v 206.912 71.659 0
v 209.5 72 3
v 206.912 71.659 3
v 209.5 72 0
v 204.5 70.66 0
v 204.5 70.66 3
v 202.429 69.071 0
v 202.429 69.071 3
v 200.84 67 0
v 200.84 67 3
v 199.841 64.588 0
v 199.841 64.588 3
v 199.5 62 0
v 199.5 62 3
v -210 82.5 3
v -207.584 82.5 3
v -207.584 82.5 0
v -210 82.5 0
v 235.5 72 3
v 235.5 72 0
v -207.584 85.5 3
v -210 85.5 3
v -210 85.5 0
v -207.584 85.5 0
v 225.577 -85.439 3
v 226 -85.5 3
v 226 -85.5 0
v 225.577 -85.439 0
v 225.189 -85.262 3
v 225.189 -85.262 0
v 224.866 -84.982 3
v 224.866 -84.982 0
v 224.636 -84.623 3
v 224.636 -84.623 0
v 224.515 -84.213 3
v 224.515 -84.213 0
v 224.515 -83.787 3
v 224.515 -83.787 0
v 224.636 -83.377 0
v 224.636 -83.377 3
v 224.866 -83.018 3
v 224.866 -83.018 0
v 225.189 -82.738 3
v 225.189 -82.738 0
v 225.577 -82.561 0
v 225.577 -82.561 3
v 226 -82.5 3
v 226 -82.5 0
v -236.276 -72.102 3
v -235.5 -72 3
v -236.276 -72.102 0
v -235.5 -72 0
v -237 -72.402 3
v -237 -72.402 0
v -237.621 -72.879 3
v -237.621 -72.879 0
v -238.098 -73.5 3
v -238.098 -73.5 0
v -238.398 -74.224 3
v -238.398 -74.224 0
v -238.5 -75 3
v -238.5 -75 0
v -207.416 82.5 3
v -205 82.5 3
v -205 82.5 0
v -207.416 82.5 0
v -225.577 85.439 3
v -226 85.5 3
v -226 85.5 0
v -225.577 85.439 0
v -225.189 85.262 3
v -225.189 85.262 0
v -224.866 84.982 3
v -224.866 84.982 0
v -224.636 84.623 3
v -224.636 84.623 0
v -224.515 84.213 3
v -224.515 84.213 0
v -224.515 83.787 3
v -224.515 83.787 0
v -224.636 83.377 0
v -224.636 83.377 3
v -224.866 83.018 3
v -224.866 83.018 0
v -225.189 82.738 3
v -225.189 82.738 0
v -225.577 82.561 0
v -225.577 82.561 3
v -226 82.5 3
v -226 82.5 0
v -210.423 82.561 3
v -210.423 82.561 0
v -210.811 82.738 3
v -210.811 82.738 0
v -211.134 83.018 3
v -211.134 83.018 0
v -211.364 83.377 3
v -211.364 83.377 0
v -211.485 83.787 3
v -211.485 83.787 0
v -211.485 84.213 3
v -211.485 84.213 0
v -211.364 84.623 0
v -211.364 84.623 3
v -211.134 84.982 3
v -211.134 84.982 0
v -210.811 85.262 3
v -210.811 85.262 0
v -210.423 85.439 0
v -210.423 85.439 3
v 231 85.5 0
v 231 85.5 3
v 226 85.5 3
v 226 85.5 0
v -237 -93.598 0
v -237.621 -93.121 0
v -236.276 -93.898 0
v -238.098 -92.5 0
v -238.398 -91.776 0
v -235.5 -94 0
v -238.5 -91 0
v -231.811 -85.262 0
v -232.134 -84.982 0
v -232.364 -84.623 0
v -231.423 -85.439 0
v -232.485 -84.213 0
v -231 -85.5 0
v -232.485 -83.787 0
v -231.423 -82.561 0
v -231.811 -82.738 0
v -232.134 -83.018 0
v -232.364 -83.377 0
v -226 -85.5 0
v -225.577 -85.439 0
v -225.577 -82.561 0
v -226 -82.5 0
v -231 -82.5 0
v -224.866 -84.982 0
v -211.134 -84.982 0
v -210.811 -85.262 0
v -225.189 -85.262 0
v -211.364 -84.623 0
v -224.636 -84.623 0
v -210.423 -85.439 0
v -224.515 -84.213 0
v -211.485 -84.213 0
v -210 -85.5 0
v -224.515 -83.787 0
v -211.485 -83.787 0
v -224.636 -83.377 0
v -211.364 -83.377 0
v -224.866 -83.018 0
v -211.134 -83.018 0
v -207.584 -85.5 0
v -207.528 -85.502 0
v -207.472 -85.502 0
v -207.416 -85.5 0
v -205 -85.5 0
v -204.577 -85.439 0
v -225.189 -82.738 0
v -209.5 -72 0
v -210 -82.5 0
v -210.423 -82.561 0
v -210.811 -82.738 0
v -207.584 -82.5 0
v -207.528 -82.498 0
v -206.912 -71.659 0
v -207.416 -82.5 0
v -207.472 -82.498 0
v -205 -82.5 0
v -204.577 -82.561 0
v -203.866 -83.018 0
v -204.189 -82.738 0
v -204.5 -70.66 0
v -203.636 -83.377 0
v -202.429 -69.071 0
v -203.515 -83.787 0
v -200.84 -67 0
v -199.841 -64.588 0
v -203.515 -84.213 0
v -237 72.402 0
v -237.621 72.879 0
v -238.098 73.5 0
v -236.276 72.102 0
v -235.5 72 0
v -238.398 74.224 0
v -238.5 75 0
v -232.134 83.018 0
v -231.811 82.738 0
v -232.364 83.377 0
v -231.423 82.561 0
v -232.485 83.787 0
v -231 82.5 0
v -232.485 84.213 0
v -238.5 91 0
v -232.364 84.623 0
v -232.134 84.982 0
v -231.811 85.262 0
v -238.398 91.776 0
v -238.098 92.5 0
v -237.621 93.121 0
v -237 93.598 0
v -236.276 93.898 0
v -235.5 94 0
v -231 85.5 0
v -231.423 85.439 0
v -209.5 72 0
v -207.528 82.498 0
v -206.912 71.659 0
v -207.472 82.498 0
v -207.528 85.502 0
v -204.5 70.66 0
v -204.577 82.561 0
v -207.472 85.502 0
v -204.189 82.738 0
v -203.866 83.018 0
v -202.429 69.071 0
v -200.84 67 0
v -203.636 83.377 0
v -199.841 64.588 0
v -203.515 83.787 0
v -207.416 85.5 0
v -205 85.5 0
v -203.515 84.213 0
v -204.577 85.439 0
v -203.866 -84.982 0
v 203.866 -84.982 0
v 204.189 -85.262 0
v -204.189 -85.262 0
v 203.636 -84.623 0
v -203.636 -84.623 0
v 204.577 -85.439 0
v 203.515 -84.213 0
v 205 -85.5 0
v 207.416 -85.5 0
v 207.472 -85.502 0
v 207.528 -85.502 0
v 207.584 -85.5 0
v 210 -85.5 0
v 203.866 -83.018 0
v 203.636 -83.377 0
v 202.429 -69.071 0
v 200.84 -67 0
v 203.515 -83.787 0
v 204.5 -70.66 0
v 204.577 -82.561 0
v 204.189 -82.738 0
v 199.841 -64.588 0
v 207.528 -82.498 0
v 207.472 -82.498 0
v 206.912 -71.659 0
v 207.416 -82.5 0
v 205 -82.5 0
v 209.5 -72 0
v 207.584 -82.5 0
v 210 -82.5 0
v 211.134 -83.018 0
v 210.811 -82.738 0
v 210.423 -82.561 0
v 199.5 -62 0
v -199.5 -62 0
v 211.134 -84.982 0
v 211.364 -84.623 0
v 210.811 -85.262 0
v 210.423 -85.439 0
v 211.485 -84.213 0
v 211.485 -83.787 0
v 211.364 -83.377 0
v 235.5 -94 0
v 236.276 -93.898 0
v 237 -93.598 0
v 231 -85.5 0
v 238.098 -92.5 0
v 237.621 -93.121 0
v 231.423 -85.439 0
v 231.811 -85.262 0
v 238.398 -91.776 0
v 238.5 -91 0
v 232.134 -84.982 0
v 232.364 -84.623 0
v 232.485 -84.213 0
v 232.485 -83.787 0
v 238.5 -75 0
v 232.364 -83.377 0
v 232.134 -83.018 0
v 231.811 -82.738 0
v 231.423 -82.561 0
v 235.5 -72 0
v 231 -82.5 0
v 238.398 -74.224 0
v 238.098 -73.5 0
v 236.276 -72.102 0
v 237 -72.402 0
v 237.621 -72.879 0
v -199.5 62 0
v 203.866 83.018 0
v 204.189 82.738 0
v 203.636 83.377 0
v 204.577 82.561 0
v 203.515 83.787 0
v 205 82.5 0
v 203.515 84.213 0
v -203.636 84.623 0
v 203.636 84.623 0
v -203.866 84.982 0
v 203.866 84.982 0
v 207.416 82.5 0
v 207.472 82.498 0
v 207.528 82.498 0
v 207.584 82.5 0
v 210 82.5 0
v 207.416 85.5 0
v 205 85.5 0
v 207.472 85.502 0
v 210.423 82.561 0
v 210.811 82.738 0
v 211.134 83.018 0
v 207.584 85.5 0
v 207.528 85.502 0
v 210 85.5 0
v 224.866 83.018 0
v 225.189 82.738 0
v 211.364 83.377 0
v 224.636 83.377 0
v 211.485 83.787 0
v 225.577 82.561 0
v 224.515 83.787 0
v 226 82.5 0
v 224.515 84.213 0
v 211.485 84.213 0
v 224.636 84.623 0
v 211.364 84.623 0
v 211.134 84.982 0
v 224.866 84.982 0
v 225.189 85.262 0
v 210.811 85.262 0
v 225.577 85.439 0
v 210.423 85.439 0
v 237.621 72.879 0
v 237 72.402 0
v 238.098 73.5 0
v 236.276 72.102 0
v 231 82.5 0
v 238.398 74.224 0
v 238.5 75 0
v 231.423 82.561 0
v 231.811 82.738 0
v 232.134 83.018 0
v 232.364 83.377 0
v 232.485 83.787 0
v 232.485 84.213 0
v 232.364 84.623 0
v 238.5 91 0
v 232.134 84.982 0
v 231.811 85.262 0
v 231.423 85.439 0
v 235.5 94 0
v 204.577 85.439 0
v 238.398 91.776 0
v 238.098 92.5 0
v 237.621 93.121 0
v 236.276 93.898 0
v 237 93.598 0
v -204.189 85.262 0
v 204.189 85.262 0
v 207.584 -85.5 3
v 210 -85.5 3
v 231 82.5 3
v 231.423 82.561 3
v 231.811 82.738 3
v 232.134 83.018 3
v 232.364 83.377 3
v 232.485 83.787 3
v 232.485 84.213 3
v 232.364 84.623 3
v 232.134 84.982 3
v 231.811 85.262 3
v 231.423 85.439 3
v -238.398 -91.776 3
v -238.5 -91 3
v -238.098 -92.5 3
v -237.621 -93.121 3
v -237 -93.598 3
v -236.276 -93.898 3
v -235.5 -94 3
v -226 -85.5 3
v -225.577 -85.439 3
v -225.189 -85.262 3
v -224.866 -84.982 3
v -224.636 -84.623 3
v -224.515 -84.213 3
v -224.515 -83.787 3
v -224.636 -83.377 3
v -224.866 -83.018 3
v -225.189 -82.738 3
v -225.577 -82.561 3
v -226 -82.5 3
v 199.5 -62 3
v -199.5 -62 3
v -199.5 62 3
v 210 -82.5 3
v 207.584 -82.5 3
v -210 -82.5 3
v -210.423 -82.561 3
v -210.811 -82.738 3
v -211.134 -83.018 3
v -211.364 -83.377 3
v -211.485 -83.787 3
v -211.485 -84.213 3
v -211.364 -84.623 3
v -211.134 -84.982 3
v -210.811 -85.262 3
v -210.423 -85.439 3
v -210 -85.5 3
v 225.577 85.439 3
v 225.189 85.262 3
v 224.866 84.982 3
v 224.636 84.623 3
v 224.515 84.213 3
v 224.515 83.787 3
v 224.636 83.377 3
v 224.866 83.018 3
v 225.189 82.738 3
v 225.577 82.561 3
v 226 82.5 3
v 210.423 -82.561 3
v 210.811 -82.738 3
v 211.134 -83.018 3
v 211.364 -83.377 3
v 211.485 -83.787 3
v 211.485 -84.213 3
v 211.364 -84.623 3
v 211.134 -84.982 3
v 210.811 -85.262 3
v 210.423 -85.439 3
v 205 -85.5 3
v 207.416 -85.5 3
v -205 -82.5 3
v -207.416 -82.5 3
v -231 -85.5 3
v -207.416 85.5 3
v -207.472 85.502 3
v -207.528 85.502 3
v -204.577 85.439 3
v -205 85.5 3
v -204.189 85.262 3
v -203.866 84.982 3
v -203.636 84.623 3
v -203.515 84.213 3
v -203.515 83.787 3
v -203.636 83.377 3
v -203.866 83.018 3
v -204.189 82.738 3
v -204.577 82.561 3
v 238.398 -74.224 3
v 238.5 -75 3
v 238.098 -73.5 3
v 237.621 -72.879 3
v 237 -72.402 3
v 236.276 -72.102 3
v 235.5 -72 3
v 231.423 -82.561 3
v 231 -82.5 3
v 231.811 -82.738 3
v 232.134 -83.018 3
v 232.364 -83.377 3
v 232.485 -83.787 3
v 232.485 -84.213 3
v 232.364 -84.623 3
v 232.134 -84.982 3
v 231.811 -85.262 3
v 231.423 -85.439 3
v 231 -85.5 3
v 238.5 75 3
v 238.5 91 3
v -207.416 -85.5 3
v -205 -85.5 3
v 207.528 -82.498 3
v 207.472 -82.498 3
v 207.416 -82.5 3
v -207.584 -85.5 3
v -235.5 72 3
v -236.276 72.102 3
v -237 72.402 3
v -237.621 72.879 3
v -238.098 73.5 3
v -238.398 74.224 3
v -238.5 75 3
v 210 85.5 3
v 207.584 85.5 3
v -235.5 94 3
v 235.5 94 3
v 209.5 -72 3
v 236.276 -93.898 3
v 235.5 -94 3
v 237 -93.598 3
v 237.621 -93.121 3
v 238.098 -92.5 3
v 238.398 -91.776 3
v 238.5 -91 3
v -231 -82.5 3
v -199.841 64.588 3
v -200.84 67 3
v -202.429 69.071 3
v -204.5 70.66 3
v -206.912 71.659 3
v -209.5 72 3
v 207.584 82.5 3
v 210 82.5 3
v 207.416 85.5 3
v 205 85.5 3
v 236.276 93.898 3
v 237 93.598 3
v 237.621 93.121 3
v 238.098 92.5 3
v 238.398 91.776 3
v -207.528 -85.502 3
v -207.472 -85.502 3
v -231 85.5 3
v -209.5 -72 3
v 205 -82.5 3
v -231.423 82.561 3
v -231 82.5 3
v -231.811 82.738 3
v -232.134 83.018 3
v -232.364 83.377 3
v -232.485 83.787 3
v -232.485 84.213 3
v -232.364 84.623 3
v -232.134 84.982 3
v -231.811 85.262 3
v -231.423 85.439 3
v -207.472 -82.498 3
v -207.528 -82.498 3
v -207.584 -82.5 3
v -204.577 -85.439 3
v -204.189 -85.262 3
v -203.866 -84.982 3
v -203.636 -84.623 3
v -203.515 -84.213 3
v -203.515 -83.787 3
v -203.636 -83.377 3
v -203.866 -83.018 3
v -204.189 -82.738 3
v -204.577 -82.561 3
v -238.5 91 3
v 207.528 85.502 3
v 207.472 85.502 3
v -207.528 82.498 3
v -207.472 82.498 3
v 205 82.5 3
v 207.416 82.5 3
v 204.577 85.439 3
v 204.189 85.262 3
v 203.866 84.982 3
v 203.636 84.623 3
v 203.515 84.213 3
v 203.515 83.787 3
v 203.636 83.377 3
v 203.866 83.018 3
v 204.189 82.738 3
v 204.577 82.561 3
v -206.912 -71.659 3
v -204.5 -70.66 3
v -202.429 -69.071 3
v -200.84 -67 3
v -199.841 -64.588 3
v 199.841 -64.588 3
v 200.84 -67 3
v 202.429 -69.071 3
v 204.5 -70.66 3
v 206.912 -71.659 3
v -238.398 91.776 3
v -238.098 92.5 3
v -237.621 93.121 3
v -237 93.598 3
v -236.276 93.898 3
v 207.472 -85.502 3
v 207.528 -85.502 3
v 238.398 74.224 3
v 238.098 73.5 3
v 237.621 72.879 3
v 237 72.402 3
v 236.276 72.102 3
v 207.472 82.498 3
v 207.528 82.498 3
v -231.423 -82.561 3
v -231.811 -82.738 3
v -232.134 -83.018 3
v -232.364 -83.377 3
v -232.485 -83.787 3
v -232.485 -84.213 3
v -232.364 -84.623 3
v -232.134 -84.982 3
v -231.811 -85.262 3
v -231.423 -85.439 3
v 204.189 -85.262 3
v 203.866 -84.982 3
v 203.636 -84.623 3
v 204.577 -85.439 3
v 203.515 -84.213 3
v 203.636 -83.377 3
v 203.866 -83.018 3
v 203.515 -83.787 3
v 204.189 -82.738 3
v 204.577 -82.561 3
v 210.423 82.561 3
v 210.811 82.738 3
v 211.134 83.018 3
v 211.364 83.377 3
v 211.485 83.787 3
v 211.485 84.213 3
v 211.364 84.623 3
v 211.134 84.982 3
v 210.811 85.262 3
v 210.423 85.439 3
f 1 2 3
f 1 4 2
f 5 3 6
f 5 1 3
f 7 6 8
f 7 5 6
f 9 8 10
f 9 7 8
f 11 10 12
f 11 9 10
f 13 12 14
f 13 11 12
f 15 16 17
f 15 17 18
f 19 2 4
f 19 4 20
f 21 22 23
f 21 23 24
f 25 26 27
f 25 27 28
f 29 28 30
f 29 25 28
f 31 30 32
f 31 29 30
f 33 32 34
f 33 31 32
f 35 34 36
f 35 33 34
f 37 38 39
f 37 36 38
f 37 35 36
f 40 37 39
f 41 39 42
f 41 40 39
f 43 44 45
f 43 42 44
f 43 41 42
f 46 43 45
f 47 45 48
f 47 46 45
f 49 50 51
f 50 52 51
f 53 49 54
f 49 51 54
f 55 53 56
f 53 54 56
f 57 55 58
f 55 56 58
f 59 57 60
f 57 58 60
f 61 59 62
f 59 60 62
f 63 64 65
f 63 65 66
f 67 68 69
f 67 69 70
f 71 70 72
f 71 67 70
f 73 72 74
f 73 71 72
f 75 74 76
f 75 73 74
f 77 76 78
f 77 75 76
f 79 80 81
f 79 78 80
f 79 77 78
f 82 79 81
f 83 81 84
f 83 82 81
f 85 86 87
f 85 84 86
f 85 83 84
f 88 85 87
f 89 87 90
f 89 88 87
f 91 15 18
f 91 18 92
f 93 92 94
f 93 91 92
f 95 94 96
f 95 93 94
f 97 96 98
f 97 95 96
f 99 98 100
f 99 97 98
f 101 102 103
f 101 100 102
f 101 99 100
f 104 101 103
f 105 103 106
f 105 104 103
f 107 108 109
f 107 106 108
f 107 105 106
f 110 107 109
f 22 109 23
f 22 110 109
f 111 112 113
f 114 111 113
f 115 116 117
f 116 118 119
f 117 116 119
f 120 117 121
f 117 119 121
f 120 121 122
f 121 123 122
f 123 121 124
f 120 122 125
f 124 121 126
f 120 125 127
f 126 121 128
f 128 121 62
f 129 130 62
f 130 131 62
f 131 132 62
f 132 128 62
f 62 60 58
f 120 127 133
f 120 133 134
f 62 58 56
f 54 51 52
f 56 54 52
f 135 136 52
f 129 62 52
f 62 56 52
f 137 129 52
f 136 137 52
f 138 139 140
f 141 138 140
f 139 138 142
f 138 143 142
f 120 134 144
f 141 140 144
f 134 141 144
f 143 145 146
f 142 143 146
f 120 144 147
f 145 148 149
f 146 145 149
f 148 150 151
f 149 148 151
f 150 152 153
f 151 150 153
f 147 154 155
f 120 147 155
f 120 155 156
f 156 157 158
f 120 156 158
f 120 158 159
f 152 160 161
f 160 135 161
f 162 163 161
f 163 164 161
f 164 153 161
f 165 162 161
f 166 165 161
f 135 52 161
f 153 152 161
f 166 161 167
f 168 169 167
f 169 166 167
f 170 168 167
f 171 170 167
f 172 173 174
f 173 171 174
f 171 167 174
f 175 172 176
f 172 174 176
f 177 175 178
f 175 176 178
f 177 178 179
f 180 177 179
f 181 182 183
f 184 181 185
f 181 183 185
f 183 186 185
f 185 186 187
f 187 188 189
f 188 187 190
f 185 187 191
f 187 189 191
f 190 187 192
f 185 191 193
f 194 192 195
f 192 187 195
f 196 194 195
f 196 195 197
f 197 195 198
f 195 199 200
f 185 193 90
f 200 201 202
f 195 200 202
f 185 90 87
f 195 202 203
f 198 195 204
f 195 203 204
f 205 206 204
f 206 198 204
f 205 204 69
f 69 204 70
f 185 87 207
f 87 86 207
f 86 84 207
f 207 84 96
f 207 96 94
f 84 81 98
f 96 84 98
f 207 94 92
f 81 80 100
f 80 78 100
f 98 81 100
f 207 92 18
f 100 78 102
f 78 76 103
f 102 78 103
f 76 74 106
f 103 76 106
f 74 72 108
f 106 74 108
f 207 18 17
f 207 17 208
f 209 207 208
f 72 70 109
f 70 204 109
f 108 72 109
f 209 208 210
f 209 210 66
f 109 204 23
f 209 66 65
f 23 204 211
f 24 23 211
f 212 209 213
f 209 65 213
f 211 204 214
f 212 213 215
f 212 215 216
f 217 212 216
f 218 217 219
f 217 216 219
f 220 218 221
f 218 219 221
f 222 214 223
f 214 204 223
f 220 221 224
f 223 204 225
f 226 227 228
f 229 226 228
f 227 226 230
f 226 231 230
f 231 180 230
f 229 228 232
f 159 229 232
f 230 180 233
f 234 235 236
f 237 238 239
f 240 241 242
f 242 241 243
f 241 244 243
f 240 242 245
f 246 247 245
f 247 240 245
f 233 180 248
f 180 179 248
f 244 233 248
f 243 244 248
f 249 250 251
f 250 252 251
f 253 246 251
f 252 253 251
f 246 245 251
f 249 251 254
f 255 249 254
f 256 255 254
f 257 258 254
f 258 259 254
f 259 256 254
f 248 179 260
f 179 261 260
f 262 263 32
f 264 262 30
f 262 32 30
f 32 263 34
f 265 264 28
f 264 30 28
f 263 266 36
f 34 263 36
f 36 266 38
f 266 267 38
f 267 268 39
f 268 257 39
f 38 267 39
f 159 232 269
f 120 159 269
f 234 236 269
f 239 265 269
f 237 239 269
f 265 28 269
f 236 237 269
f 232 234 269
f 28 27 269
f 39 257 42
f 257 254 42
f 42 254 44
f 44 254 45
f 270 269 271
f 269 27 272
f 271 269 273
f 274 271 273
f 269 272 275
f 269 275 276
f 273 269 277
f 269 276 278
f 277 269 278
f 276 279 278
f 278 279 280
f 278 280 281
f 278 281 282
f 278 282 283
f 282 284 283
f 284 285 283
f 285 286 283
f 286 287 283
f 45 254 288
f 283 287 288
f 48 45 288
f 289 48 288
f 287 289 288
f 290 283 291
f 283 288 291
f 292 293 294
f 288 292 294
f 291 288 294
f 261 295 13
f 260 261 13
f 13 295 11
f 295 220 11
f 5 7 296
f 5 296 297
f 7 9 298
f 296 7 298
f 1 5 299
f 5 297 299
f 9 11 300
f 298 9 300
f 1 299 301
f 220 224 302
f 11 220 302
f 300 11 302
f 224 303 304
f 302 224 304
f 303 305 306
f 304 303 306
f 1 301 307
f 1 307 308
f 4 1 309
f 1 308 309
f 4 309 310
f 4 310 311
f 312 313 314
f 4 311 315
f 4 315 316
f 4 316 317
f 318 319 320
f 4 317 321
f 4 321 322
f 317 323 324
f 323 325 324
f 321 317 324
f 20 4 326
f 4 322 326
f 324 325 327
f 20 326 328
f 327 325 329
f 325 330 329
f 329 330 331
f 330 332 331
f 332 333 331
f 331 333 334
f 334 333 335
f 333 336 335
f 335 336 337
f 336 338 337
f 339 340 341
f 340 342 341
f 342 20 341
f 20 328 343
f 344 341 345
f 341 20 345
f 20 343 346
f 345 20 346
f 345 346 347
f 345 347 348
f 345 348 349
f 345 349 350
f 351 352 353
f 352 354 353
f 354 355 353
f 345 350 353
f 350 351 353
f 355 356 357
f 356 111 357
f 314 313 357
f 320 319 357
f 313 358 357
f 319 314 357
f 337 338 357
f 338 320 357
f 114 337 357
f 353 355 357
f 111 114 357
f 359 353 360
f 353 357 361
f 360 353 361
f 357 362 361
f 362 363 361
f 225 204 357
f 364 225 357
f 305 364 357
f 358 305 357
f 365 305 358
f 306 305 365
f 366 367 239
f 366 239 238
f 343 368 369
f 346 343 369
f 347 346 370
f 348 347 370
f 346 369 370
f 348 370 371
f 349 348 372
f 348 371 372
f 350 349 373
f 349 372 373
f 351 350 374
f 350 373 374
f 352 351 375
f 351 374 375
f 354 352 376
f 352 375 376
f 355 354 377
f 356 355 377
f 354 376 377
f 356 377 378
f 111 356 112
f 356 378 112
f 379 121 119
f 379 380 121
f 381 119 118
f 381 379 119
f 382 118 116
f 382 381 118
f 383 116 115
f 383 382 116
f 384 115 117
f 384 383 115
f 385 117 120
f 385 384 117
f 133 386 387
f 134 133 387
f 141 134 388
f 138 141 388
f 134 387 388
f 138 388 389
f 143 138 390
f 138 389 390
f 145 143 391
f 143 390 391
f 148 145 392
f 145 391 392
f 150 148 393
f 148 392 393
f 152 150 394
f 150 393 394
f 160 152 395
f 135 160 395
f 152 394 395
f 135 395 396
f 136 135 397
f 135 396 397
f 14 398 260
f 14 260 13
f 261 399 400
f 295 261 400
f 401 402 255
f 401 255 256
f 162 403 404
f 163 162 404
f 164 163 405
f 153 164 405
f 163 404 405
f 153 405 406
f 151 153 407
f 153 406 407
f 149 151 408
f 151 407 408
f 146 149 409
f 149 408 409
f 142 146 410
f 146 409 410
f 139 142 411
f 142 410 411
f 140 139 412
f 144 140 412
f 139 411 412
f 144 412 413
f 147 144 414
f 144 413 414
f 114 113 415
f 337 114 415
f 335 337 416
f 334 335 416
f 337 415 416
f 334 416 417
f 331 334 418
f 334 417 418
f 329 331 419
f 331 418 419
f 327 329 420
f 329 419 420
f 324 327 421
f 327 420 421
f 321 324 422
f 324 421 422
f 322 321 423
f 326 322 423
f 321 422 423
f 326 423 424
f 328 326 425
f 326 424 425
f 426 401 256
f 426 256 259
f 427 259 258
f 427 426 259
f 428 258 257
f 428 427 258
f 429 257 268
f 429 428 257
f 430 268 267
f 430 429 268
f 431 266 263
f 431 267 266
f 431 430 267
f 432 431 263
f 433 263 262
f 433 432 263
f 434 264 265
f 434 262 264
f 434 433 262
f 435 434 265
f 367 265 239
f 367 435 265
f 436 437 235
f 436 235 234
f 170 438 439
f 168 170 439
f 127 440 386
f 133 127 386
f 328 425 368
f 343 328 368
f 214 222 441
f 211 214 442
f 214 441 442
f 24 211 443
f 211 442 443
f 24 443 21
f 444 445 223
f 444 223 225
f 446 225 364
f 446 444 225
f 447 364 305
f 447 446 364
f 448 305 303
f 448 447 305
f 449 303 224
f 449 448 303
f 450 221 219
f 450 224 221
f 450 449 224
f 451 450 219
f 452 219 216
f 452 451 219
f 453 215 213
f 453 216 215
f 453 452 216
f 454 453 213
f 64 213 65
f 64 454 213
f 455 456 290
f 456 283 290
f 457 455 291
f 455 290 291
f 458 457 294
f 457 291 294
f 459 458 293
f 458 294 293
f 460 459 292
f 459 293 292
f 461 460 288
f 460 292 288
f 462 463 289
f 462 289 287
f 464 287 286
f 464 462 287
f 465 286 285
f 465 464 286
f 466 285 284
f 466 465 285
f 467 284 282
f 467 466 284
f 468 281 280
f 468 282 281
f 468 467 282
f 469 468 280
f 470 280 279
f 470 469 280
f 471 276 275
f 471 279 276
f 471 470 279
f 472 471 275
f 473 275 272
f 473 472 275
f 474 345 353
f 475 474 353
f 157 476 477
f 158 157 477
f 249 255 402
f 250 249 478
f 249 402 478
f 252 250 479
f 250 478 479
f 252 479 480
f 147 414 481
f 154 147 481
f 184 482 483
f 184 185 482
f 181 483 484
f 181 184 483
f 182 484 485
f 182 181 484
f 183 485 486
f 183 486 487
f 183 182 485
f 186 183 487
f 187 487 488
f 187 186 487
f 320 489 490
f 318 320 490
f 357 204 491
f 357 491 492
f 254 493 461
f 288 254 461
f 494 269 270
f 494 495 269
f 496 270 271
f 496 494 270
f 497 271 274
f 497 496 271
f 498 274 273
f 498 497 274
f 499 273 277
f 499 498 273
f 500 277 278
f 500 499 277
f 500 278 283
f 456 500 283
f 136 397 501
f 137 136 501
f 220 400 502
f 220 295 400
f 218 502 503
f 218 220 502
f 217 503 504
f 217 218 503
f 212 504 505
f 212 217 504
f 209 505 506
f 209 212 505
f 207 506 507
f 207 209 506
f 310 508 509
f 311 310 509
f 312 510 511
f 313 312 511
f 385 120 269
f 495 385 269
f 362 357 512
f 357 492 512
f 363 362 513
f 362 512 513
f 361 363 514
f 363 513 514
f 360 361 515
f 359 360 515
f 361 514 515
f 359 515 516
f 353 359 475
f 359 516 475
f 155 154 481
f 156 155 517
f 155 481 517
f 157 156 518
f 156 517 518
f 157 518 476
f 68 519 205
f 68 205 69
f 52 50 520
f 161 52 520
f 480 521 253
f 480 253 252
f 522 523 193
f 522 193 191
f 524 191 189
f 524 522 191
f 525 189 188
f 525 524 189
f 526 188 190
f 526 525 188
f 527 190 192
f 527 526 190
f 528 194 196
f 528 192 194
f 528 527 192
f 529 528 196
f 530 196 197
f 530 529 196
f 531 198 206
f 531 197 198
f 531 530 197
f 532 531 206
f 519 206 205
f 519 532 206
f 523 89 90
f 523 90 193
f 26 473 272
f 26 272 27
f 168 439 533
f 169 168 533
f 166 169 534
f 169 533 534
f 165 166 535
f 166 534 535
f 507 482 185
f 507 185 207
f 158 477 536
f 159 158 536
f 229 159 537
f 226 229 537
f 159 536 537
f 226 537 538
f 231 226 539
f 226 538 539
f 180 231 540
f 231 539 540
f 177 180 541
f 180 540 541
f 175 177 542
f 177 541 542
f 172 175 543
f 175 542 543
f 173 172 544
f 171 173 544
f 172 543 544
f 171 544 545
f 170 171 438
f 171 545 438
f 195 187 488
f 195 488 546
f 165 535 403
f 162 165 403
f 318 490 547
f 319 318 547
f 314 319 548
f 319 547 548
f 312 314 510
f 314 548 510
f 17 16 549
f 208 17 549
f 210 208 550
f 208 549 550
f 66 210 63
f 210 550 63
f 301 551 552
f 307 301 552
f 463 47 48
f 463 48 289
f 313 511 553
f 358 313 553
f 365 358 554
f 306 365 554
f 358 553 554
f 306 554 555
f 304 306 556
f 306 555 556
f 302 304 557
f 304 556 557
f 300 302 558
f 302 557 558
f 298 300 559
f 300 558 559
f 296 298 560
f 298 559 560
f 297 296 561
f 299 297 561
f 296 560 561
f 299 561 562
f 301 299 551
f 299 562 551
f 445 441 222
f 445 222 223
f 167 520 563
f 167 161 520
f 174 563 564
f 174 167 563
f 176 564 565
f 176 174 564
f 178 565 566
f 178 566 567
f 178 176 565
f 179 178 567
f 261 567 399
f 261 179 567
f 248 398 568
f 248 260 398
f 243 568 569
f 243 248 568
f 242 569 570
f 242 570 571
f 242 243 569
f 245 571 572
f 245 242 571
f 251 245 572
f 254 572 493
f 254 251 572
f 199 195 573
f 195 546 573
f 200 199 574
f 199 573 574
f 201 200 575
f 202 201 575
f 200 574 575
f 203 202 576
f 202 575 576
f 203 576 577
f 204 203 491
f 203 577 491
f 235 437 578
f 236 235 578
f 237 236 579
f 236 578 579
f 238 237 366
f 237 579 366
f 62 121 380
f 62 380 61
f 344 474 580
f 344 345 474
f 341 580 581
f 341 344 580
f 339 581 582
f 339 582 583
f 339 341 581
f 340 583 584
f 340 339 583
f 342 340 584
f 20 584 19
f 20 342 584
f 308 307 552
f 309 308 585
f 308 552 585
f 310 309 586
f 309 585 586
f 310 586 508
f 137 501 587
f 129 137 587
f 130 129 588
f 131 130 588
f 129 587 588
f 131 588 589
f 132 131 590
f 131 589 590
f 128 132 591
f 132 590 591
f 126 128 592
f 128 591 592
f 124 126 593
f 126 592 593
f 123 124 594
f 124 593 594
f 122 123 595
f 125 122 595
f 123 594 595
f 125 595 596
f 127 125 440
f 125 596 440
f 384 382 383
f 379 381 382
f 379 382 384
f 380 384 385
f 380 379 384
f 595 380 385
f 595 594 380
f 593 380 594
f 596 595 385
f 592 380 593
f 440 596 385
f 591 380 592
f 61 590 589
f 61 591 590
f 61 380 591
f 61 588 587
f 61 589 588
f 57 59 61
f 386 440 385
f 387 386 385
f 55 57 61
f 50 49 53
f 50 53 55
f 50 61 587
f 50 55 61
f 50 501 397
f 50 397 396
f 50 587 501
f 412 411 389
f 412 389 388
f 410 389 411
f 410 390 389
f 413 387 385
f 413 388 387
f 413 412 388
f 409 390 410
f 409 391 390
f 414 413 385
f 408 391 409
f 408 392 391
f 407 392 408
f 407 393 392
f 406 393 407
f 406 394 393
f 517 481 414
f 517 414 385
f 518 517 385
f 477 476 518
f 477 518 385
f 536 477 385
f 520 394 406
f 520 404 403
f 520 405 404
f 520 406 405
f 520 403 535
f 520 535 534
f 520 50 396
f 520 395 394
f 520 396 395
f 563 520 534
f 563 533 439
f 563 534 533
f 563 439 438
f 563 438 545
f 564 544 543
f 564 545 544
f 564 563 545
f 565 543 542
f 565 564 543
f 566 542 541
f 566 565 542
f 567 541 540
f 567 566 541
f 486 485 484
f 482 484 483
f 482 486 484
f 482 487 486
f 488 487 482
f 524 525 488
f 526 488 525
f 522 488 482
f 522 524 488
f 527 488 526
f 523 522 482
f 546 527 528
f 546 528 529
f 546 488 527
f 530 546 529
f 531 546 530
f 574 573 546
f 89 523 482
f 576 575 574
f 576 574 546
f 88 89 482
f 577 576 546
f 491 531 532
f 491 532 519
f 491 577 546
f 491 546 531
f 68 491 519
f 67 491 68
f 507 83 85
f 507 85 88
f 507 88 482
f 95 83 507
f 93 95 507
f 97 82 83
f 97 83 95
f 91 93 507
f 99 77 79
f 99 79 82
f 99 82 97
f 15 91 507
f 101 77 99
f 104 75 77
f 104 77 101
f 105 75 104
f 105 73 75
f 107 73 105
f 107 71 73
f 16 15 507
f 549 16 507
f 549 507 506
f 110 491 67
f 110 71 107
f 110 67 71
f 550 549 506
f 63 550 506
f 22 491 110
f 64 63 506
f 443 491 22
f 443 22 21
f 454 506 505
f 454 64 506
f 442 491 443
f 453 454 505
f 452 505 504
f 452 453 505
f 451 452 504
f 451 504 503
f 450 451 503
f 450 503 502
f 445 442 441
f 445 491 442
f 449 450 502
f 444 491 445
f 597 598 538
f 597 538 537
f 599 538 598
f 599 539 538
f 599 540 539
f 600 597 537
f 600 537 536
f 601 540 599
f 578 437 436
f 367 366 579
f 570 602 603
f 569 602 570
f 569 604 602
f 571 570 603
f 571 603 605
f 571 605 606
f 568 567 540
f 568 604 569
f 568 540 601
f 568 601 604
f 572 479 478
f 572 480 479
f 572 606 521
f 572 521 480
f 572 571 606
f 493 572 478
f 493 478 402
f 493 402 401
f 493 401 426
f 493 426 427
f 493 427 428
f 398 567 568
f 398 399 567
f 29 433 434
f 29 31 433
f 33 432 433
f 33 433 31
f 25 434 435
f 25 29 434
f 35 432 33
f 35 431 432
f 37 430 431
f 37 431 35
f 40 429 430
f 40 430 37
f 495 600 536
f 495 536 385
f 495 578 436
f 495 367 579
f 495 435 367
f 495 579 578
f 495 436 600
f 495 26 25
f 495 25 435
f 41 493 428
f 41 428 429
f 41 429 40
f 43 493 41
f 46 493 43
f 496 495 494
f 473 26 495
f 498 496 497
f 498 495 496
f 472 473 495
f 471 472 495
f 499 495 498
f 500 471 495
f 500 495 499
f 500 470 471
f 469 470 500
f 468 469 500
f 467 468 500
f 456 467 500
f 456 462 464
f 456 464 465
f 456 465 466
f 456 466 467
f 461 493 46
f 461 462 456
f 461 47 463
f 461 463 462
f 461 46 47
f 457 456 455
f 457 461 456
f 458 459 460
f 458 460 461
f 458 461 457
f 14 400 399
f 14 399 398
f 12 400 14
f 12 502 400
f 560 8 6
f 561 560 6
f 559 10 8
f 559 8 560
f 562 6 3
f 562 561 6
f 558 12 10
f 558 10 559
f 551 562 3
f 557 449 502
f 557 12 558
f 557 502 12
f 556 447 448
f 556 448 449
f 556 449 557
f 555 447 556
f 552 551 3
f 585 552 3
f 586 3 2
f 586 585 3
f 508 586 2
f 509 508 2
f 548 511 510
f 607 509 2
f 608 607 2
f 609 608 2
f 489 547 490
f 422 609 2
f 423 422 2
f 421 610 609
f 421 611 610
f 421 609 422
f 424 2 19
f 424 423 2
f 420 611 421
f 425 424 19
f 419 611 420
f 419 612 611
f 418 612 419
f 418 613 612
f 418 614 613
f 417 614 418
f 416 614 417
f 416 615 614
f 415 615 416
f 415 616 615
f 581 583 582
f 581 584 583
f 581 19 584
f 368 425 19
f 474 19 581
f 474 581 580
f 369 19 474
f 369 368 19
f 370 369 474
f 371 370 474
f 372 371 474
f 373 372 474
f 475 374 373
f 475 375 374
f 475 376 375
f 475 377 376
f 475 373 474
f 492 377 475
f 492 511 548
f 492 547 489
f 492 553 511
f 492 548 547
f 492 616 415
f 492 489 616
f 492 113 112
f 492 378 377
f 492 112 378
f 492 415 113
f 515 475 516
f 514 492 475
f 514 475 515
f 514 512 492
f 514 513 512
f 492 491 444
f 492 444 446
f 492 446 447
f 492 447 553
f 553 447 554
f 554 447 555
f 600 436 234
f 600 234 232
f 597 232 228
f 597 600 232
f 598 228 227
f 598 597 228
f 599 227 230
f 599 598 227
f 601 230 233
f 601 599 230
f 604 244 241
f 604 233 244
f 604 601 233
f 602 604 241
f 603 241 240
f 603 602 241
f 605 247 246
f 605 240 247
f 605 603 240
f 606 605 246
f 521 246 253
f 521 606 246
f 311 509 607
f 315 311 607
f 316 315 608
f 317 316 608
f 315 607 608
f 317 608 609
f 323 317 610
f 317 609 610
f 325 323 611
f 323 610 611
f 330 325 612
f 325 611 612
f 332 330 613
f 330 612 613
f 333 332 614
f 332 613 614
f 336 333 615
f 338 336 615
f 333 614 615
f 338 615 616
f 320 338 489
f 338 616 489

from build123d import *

# Parameters (mm, degrees)
SKETCH_1_W          = 477
SKETCH_1_H          = 188
EXTRUDE_1_DEPTH     = 3
SKETCH_2_R          = 1.5
SKETCH_2_R_2        = 1.502344372
CUT_EXTRUDE_1_DEPTH = 257.373263037
CUT_EXTRUDE_3_DEPTH = 10
SKETCH_3_W          = 39
SKETCH_3_H          = 144
CUT_EXTRUDE_4_DEPTH = 10
FILLET_1_R          = 10
FILLET_2_R          = 3


with BuildPart() as part:
    # 草图1 → 凸台-拉伸1 (new body)
    with BuildSketch(Plane.XY):
        Rectangle(SKETCH_1_W, SKETCH_1_H)
    extrude(amount=EXTRUDE_1_DEPTH)

    # 草图2 → 切除-拉伸1 (cut, through all)
    with BuildSketch(Plane.XY.offset(3)):
        with Locations((228.5, 84)):
            Circle(SKETCH_2_R)
        with Locations((-228.5, 84)):
            Circle(SKETCH_2_R)
        with Locations((-228.5, -84)):
            Circle(SKETCH_2_R)
        with Locations((228.5, -84)):
            Circle(SKETCH_2_R)
        with Locations((207.5, -84)):
            Circle(SKETCH_2_R_2)
        with Locations(Location((207.5, 84, 0), (0, 0, 180))):
            Circle(SKETCH_2_R_2)
        with Locations(Location((-207.5, -84, 0), (0, 0, 180))):
            Circle(SKETCH_2_R_2)
        with Locations((-207.5, 84)):
            Circle(SKETCH_2_R_2)
    extrude(amount=-CUT_EXTRUDE_1_DEPTH, mode=Mode.SUBTRACT)

    # 草图4 → 切除-拉伸3 (cut)
    with BuildSketch(Plane.XY.offset(3)):
        with BuildLine():
            Line((-231, 85.5), (-226, 85.5))
            ThreePointArc((-226, 85.5), (-224.5, 84), (-226, 82.5))
            Line((-226, 82.5), (-231, 82.5))
            ThreePointArc((-231, 82.5), (-232.5, 84), (-231, 85.5))
        make_face()
        with BuildLine():
            Line((-210, 85.5), (-205, 85.5))
            ThreePointArc((-205, 85.5), (-203.5, 84), (-205, 82.5))
            Line((-205, 82.5), (-210, 82.5))
            ThreePointArc((-210, 82.5), (-211.5, 84), (-210, 85.5))
        make_face()
        with BuildLine():
            Line((231, 85.5), (226, 85.5))
            ThreePointArc((226, 85.5), (224.5, 84), (226, 82.5))
            Line((226, 82.5), (231, 82.5))
            ThreePointArc((231, 82.5), (232.5, 84), (231, 85.5))
        make_face()
        with BuildLine():
            Line((210, 85.5), (205, 85.5))
            ThreePointArc((205, 85.5), (203.5, 84), (205, 82.5))
            Line((205, 82.5), (210, 82.5))
            ThreePointArc((210, 82.5), (211.5, 84), (210, 85.5))
        make_face()
    cut_extrude_3 = extrude(amount=-CUT_EXTRUDE_3_DEPTH, mode=Mode.SUBTRACT)

    # 镜向1: 切除-拉伸3 across plane
    add(cut_extrude_3.mirror(Plane.ZX), mode=Mode.SUBTRACT)

    # 草图3 → 切除-拉伸4 (cut)
    with BuildSketch(Plane.XY.offset(3)):
        with Locations((219, 0)):
            Rectangle(SKETCH_3_W, SKETCH_3_H)
        with Locations((-219, 0)):
            Rectangle(SKETCH_3_W, SKETCH_3_H)
    extrude(amount=-CUT_EXTRUDE_4_DEPTH, mode=Mode.SUBTRACT)

    # 圆角1
    fillet_1_edges = [part.edges().sort_by_distance(p)[0] for p in [
        (199.5, -72, 1.5),
        (199.5, 72, 1.5),
        (-199.5, 72, 1.5),
        (-199.5, -72, 1.5),
    ]]
    fillet(fillet_1_edges, radius=FILLET_1_R)

    # 圆角2
    fillet_2_edges = [part.edges().sort_by_distance(p)[0] for p in [
        (-238.5, 72, 1.5),
        (-238.5, -72, 1.5),
        (238.5, 72, 1.5),
        (238.5, -72, 1.5),
        (238.5, -94, 1.5),
        (-238.5, -94, 1.5),
        (-238.5, 94, 1.5),
        (238.5, 94, 1.5),
    ]]
    fillet(fillet_2_edges, radius=FILLET_2_R)


solid = part.part
